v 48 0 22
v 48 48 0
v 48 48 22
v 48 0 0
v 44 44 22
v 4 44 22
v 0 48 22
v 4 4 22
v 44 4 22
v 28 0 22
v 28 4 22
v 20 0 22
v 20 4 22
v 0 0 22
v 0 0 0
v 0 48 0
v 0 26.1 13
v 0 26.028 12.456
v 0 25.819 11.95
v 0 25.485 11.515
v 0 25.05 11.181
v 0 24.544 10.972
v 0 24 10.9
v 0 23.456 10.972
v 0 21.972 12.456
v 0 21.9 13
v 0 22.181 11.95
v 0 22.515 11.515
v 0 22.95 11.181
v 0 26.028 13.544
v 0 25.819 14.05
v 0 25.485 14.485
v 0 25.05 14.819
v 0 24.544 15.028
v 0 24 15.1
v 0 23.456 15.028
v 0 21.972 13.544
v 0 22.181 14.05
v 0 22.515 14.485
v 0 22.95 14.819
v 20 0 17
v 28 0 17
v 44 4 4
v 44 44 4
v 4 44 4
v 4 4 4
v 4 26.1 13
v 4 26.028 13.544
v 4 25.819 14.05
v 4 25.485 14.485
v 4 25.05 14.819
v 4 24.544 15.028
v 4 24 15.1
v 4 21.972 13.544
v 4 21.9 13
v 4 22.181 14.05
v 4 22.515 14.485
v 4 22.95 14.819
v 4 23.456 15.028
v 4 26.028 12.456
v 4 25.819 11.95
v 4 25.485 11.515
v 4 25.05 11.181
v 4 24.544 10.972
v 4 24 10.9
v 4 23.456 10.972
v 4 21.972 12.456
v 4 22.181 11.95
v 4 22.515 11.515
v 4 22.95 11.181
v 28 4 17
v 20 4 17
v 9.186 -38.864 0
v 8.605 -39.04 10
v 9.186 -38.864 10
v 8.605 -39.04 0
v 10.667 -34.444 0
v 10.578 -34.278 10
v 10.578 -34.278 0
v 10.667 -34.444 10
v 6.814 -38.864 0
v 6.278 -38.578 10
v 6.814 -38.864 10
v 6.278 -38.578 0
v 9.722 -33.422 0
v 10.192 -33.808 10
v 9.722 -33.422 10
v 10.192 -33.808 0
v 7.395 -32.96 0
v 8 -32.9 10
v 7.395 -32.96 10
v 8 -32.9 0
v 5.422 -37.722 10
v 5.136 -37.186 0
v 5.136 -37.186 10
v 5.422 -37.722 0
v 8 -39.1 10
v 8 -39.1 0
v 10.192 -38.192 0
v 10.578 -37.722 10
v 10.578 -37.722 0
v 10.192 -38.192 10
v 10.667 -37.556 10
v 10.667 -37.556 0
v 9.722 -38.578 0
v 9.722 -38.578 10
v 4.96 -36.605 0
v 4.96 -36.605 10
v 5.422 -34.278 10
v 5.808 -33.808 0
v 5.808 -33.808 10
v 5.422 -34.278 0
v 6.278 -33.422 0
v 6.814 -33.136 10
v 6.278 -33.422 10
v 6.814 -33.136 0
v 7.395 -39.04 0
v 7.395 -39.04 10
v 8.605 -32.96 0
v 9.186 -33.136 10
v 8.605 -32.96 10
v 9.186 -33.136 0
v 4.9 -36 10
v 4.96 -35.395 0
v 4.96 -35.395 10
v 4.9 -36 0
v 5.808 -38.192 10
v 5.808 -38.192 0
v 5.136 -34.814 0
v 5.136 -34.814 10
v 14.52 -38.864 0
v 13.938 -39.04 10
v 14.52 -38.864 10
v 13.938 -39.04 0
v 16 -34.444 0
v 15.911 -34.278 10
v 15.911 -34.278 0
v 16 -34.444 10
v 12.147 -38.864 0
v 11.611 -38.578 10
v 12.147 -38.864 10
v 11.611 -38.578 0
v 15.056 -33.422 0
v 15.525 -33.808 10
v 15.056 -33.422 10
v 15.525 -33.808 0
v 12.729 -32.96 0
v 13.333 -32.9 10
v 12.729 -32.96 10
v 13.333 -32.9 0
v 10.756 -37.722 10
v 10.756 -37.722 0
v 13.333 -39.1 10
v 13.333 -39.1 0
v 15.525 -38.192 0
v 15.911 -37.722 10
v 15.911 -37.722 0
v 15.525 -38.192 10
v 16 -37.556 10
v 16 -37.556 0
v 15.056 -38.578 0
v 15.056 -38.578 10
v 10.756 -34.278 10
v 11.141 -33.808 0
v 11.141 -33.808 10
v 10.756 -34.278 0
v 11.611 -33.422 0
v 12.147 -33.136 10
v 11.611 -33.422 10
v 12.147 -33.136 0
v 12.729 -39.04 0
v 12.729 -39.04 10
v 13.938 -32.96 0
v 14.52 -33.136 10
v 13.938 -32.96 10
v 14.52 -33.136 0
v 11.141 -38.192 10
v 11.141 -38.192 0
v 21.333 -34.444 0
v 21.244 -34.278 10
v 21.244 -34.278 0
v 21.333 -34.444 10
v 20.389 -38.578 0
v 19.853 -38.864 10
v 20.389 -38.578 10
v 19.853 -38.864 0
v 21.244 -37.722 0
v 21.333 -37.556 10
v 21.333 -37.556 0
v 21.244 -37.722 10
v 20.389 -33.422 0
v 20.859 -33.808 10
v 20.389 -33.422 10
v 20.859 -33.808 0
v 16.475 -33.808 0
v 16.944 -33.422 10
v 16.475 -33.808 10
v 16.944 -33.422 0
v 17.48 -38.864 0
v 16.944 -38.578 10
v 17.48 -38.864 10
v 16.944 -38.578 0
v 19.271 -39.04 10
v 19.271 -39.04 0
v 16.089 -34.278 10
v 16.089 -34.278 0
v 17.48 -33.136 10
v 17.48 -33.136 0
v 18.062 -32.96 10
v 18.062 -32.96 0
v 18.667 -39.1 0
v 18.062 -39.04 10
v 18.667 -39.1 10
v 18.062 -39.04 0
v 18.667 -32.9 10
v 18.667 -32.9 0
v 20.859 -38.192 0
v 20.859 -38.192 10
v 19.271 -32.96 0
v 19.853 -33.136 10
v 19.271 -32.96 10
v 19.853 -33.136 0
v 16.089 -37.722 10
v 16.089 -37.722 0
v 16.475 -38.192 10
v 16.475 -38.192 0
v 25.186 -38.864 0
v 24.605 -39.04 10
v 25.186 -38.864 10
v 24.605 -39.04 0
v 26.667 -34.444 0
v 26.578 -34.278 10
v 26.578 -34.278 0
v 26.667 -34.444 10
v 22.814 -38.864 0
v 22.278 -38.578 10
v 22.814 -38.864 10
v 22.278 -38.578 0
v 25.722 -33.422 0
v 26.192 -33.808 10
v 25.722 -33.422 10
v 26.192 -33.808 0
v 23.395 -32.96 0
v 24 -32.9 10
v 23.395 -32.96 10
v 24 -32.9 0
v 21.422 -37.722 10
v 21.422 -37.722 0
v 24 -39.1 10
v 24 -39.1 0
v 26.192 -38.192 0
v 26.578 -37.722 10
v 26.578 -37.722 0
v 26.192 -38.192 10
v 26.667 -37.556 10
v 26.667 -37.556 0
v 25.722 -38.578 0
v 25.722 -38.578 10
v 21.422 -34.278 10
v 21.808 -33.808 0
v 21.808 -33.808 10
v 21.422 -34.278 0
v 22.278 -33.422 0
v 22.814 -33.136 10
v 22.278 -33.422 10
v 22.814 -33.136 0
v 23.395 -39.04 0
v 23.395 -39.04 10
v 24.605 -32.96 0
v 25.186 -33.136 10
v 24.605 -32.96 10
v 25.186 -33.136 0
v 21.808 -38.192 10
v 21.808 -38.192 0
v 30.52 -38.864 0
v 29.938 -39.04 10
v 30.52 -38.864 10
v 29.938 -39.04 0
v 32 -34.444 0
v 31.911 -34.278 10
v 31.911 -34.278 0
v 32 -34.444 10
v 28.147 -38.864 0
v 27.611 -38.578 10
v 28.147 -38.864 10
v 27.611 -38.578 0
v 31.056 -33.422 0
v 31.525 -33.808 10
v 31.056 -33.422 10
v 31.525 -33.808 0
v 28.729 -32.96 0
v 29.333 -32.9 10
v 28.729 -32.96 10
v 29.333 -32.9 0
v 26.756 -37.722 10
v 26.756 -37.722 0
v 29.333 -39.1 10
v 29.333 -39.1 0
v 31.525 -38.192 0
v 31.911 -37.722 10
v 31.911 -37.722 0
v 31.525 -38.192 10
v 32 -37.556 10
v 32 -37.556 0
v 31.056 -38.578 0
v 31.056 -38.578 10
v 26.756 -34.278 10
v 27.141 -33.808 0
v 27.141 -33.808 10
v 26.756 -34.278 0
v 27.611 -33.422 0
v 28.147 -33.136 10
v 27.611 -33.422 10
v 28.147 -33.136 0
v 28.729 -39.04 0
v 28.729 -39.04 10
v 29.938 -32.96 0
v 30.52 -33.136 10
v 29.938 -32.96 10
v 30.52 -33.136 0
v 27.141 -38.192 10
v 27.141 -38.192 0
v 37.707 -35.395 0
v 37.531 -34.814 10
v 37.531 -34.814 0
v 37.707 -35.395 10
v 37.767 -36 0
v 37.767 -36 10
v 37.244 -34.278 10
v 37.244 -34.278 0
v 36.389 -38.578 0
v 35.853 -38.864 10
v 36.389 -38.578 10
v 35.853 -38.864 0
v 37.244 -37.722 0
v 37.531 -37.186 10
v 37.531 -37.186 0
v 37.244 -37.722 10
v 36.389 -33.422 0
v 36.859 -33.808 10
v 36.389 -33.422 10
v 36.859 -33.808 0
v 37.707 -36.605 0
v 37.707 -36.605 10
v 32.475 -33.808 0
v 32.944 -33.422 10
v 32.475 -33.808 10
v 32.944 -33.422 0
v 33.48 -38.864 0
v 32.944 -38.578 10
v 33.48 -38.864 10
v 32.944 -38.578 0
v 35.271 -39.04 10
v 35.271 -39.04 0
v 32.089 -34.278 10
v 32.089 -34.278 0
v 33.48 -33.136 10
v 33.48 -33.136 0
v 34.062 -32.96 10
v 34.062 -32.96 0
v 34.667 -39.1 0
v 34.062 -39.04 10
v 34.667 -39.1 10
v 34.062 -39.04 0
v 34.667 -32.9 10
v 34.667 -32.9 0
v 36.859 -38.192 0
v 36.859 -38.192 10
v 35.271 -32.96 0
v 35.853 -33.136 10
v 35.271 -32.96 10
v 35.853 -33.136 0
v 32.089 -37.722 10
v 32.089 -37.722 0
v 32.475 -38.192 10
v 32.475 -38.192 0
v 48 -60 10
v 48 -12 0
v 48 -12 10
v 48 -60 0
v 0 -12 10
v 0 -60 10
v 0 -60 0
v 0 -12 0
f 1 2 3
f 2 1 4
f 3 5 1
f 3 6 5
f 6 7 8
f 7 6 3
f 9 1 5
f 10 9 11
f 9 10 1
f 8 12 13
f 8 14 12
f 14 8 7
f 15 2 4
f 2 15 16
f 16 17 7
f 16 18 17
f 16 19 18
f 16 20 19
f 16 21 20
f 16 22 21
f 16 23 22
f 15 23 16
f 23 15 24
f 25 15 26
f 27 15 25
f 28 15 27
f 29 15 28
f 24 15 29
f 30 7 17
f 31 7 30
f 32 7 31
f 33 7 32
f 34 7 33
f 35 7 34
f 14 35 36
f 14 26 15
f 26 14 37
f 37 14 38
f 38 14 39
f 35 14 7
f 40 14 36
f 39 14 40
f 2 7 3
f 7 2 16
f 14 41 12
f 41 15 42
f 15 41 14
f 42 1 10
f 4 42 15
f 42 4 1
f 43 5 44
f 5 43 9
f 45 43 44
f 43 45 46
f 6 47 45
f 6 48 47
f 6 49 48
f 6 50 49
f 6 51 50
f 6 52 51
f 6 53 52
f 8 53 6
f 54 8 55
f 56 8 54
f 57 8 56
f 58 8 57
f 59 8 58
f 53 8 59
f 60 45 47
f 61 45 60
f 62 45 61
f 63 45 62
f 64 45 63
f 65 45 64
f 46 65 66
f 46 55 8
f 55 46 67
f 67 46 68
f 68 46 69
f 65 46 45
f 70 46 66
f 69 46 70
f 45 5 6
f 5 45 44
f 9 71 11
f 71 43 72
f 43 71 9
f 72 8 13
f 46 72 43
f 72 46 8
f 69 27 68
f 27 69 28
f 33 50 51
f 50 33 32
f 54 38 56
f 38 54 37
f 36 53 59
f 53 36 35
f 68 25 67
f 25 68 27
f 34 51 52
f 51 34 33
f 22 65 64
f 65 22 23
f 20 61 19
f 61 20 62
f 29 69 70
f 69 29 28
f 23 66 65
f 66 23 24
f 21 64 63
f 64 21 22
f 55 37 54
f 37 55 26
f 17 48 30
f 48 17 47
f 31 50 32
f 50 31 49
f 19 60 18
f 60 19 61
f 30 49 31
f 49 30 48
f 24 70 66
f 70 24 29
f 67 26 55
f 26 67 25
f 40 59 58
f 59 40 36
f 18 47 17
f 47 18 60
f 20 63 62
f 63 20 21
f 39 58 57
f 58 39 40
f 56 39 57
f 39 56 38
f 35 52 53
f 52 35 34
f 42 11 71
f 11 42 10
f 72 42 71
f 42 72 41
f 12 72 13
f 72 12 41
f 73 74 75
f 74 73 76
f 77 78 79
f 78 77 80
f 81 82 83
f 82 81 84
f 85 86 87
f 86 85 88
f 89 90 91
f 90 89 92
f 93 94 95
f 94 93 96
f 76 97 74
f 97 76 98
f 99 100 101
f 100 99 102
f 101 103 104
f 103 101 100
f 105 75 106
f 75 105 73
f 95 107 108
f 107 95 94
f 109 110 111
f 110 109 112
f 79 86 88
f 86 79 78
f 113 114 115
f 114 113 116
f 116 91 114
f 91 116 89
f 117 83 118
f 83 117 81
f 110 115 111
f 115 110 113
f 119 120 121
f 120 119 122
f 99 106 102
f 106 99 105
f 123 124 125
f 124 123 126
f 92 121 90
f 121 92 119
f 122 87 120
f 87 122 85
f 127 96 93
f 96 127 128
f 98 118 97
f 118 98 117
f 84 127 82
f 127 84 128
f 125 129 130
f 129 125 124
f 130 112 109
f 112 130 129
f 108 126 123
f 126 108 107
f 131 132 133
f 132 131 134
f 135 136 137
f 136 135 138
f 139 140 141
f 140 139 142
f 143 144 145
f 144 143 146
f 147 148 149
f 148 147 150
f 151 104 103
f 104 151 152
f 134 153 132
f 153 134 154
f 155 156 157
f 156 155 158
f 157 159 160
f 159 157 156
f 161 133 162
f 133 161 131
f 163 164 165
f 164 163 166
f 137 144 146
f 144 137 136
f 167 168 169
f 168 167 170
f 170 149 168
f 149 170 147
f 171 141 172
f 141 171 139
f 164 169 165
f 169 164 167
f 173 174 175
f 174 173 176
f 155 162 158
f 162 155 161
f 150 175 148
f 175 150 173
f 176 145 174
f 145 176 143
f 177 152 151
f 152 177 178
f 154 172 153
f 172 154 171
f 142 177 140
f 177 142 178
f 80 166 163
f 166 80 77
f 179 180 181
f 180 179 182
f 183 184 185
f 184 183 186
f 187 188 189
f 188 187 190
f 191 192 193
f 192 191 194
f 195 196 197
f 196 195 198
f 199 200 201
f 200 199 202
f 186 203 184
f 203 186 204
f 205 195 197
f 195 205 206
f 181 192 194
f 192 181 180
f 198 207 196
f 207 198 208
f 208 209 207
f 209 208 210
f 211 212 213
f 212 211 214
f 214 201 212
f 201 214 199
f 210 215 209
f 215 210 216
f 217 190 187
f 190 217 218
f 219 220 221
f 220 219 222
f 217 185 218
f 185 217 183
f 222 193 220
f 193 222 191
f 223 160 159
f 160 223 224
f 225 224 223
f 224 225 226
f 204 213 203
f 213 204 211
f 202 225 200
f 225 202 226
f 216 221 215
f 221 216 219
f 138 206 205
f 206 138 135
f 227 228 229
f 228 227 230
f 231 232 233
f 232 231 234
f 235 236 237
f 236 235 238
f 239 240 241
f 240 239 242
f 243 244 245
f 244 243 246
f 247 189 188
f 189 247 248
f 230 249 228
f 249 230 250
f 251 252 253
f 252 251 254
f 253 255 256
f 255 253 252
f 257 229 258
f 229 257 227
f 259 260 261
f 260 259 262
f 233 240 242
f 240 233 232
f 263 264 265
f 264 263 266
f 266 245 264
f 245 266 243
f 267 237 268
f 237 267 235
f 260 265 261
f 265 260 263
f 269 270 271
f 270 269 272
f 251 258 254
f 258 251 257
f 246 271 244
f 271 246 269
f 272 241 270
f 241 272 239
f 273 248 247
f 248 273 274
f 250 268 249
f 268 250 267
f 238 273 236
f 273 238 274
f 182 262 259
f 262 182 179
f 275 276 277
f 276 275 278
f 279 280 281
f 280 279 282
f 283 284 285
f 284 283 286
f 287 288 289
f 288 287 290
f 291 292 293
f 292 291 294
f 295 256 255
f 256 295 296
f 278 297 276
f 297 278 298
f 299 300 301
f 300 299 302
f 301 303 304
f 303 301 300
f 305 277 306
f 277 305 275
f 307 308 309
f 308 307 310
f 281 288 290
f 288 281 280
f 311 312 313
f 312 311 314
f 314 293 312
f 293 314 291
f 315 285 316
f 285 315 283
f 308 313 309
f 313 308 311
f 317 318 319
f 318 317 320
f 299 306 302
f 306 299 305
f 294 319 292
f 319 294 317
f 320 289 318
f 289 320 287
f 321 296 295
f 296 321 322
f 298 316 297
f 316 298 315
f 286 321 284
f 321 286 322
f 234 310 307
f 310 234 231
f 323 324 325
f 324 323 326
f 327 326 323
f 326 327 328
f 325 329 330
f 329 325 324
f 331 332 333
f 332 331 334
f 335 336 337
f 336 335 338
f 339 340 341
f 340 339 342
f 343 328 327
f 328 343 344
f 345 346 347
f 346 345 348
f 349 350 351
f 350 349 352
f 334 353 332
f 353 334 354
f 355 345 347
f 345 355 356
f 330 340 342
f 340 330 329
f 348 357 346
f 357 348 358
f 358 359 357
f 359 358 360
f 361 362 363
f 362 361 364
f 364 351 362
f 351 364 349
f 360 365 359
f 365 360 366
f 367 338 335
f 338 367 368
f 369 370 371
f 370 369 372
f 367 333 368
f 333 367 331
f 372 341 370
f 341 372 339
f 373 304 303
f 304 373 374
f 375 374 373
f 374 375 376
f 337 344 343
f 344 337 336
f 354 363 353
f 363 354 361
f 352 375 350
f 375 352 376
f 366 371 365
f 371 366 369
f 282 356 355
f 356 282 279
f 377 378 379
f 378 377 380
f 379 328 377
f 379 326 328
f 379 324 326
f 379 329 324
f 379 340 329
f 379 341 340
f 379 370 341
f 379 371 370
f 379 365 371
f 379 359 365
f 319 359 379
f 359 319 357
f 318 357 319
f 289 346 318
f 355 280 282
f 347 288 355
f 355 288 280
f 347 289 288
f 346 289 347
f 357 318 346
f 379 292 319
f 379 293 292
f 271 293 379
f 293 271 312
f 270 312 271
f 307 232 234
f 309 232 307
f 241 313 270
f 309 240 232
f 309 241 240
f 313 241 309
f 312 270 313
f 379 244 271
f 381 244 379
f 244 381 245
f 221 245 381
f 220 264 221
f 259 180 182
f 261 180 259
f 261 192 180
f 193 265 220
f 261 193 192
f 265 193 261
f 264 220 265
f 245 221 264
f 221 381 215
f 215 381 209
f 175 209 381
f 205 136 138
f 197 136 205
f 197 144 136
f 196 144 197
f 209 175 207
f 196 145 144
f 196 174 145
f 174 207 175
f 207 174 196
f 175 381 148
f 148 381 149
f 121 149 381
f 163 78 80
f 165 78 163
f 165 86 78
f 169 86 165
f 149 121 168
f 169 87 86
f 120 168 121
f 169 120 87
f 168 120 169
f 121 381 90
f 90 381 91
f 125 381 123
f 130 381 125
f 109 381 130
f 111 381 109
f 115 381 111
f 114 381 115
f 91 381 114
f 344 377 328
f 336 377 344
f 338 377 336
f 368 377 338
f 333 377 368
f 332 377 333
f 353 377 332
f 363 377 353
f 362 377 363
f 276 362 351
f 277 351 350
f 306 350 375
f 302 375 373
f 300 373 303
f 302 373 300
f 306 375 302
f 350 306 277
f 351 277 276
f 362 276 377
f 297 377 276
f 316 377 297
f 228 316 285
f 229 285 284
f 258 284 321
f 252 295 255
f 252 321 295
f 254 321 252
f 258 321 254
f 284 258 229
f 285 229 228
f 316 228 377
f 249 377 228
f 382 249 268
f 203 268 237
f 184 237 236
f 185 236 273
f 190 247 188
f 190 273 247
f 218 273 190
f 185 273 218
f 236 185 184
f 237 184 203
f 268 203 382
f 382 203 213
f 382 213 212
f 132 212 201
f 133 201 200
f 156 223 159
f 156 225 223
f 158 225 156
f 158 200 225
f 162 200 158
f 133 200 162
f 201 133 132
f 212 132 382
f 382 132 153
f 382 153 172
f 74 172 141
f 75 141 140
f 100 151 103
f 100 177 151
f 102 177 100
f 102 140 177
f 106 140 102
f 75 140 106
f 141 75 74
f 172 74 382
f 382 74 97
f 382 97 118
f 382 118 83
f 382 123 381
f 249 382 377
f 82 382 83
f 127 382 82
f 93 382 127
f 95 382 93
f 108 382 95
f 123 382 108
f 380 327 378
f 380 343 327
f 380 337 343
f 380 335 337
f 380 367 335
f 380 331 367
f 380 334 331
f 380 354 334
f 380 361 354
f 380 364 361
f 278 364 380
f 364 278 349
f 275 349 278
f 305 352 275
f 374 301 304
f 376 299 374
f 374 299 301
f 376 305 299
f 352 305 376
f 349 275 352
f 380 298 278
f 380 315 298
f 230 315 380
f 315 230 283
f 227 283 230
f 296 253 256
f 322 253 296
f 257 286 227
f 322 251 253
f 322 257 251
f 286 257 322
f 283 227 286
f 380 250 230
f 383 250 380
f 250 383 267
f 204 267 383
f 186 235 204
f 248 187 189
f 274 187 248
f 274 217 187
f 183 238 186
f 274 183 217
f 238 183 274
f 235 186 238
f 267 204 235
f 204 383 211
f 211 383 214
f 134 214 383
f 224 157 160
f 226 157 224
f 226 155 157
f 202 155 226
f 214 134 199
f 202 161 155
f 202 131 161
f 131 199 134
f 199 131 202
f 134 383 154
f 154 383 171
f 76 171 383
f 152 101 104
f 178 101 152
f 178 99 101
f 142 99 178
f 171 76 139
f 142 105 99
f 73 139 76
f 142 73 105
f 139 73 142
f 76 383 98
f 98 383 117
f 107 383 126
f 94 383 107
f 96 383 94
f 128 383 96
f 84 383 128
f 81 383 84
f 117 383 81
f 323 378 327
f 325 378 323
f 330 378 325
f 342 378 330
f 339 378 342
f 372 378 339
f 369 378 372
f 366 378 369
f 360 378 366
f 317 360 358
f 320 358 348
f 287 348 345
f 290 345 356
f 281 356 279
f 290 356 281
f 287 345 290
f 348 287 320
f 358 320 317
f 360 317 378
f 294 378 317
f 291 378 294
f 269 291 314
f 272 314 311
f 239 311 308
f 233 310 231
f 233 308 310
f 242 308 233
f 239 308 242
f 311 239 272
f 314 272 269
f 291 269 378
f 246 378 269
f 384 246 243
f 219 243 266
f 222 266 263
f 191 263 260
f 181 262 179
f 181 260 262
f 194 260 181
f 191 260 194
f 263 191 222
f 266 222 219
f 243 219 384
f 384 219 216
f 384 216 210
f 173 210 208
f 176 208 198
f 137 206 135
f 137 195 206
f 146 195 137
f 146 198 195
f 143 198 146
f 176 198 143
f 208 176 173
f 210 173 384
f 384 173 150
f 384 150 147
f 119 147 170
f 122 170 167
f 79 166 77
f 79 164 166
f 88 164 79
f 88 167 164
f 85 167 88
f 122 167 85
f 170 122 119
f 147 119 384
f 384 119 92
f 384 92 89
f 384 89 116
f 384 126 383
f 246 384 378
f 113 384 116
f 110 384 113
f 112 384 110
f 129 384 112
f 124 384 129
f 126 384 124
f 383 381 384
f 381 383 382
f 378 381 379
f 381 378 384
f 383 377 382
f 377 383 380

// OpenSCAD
// Molecular Synth v0 - parametric Peltier folding-block enclosure
// ================================================================
// Stack (bottom -> top):  heatsink + fan  |  Peltier TEC1-12706 (40x40 mm)  |
// aluminium block drilled for 0.2 mL PCR tubes  |  this printed insulating collar
// + lid that clamps the stack and holds the NTC thermistor against the block.
//
// The Peltier is driven bidirectionally (BTS7960 H-bridge) by thermocycler.ino so
// the block both heats to 90 C and slow-cools to 20 C - the origami folding ramp.
// Print in PETG (better >60 C than PLA) or ASA. Dimensions in mm.
//
//   openscad -D part=\"collar\" -o collar.stl thermocycler_block.scad
//   part = \"collar\" | \"lid\" | \"all\"

/* [Peltier + block] */
pelt        = 40;     // Peltier edge (TEC1-12706 is 40x40x3.x mm)
block_x     = 40;
block_y     = 40;
block_h     = 18;     // aluminium block height
wall        = 4;
collar_h    = 22;

/* [Tube holes - for reference / a printable block if no aluminium] */
n_tubes     = 6;
tube_top_d  = 6.2;    // 0.2 mL tube top dia
tube_bot_d  = 2.8;
tube_depth  = 16;

/* [Thermistor] */
therm_d     = 4.2;    // channel for a glass-bead/epoxy NTC

part = "all";

module insulating_collar() {
    difference() {
        cube([block_x + 2*wall, block_y + 2*wall, collar_h]);
        // pocket the aluminium block sits in
        translate([wall, wall, wall])
            cube([block_x, block_y, collar_h]);
        // thermistor channel into the block pocket from the side
        translate([-1, wall + block_y/2, wall + block_h/2])
            rotate([0,90,0]) cylinder(h = wall + 2, d = therm_d, $fn=24);
        // wire exit slot
        translate([block_x/2, -1, collar_h-5]) cube([8, wall+2, 6]);
    }
}

module clamp_lid() {
    difference() {
        cube([block_x + 2*wall, block_y + 2*wall, wall + 6]);
        // tube access holes (align over the aluminium block bores)
        span = block_x - 8;
        pitch = span / n_tubes;
        for (i = [0 : n_tubes-1])
            translate([wall + 4 + i*pitch, block_y/2 + wall, -1])
                cylinder(h = wall + 8, d = tube_top_d, $fn=32);
    }
}

// Optional: a fully-printable aluminium-free block is NOT recommended (plastic is a
// poor conductor); use a drilled aluminium bar. This module documents the bore map.
module reference_block() {
    difference() {
        cube([block_x, block_y, block_h]);
        span = block_x - 8;
        pitch = span / n_tubes;
        for (i = [0 : n_tubes-1])
            translate([4 + i*pitch, block_y/2, block_h - tube_depth + 0.1])
                cylinder(h = tube_depth + 1, d1 = tube_bot_d, d2 = tube_top_d, $fn=32);
    }
}

if (part == "collar" || part == "all") insulating_collar();
if (part == "lid"    || part == "all") translate([0, -block_y - 20, 0]) clamp_lid();
if (part == "block_ref") reference_block();
